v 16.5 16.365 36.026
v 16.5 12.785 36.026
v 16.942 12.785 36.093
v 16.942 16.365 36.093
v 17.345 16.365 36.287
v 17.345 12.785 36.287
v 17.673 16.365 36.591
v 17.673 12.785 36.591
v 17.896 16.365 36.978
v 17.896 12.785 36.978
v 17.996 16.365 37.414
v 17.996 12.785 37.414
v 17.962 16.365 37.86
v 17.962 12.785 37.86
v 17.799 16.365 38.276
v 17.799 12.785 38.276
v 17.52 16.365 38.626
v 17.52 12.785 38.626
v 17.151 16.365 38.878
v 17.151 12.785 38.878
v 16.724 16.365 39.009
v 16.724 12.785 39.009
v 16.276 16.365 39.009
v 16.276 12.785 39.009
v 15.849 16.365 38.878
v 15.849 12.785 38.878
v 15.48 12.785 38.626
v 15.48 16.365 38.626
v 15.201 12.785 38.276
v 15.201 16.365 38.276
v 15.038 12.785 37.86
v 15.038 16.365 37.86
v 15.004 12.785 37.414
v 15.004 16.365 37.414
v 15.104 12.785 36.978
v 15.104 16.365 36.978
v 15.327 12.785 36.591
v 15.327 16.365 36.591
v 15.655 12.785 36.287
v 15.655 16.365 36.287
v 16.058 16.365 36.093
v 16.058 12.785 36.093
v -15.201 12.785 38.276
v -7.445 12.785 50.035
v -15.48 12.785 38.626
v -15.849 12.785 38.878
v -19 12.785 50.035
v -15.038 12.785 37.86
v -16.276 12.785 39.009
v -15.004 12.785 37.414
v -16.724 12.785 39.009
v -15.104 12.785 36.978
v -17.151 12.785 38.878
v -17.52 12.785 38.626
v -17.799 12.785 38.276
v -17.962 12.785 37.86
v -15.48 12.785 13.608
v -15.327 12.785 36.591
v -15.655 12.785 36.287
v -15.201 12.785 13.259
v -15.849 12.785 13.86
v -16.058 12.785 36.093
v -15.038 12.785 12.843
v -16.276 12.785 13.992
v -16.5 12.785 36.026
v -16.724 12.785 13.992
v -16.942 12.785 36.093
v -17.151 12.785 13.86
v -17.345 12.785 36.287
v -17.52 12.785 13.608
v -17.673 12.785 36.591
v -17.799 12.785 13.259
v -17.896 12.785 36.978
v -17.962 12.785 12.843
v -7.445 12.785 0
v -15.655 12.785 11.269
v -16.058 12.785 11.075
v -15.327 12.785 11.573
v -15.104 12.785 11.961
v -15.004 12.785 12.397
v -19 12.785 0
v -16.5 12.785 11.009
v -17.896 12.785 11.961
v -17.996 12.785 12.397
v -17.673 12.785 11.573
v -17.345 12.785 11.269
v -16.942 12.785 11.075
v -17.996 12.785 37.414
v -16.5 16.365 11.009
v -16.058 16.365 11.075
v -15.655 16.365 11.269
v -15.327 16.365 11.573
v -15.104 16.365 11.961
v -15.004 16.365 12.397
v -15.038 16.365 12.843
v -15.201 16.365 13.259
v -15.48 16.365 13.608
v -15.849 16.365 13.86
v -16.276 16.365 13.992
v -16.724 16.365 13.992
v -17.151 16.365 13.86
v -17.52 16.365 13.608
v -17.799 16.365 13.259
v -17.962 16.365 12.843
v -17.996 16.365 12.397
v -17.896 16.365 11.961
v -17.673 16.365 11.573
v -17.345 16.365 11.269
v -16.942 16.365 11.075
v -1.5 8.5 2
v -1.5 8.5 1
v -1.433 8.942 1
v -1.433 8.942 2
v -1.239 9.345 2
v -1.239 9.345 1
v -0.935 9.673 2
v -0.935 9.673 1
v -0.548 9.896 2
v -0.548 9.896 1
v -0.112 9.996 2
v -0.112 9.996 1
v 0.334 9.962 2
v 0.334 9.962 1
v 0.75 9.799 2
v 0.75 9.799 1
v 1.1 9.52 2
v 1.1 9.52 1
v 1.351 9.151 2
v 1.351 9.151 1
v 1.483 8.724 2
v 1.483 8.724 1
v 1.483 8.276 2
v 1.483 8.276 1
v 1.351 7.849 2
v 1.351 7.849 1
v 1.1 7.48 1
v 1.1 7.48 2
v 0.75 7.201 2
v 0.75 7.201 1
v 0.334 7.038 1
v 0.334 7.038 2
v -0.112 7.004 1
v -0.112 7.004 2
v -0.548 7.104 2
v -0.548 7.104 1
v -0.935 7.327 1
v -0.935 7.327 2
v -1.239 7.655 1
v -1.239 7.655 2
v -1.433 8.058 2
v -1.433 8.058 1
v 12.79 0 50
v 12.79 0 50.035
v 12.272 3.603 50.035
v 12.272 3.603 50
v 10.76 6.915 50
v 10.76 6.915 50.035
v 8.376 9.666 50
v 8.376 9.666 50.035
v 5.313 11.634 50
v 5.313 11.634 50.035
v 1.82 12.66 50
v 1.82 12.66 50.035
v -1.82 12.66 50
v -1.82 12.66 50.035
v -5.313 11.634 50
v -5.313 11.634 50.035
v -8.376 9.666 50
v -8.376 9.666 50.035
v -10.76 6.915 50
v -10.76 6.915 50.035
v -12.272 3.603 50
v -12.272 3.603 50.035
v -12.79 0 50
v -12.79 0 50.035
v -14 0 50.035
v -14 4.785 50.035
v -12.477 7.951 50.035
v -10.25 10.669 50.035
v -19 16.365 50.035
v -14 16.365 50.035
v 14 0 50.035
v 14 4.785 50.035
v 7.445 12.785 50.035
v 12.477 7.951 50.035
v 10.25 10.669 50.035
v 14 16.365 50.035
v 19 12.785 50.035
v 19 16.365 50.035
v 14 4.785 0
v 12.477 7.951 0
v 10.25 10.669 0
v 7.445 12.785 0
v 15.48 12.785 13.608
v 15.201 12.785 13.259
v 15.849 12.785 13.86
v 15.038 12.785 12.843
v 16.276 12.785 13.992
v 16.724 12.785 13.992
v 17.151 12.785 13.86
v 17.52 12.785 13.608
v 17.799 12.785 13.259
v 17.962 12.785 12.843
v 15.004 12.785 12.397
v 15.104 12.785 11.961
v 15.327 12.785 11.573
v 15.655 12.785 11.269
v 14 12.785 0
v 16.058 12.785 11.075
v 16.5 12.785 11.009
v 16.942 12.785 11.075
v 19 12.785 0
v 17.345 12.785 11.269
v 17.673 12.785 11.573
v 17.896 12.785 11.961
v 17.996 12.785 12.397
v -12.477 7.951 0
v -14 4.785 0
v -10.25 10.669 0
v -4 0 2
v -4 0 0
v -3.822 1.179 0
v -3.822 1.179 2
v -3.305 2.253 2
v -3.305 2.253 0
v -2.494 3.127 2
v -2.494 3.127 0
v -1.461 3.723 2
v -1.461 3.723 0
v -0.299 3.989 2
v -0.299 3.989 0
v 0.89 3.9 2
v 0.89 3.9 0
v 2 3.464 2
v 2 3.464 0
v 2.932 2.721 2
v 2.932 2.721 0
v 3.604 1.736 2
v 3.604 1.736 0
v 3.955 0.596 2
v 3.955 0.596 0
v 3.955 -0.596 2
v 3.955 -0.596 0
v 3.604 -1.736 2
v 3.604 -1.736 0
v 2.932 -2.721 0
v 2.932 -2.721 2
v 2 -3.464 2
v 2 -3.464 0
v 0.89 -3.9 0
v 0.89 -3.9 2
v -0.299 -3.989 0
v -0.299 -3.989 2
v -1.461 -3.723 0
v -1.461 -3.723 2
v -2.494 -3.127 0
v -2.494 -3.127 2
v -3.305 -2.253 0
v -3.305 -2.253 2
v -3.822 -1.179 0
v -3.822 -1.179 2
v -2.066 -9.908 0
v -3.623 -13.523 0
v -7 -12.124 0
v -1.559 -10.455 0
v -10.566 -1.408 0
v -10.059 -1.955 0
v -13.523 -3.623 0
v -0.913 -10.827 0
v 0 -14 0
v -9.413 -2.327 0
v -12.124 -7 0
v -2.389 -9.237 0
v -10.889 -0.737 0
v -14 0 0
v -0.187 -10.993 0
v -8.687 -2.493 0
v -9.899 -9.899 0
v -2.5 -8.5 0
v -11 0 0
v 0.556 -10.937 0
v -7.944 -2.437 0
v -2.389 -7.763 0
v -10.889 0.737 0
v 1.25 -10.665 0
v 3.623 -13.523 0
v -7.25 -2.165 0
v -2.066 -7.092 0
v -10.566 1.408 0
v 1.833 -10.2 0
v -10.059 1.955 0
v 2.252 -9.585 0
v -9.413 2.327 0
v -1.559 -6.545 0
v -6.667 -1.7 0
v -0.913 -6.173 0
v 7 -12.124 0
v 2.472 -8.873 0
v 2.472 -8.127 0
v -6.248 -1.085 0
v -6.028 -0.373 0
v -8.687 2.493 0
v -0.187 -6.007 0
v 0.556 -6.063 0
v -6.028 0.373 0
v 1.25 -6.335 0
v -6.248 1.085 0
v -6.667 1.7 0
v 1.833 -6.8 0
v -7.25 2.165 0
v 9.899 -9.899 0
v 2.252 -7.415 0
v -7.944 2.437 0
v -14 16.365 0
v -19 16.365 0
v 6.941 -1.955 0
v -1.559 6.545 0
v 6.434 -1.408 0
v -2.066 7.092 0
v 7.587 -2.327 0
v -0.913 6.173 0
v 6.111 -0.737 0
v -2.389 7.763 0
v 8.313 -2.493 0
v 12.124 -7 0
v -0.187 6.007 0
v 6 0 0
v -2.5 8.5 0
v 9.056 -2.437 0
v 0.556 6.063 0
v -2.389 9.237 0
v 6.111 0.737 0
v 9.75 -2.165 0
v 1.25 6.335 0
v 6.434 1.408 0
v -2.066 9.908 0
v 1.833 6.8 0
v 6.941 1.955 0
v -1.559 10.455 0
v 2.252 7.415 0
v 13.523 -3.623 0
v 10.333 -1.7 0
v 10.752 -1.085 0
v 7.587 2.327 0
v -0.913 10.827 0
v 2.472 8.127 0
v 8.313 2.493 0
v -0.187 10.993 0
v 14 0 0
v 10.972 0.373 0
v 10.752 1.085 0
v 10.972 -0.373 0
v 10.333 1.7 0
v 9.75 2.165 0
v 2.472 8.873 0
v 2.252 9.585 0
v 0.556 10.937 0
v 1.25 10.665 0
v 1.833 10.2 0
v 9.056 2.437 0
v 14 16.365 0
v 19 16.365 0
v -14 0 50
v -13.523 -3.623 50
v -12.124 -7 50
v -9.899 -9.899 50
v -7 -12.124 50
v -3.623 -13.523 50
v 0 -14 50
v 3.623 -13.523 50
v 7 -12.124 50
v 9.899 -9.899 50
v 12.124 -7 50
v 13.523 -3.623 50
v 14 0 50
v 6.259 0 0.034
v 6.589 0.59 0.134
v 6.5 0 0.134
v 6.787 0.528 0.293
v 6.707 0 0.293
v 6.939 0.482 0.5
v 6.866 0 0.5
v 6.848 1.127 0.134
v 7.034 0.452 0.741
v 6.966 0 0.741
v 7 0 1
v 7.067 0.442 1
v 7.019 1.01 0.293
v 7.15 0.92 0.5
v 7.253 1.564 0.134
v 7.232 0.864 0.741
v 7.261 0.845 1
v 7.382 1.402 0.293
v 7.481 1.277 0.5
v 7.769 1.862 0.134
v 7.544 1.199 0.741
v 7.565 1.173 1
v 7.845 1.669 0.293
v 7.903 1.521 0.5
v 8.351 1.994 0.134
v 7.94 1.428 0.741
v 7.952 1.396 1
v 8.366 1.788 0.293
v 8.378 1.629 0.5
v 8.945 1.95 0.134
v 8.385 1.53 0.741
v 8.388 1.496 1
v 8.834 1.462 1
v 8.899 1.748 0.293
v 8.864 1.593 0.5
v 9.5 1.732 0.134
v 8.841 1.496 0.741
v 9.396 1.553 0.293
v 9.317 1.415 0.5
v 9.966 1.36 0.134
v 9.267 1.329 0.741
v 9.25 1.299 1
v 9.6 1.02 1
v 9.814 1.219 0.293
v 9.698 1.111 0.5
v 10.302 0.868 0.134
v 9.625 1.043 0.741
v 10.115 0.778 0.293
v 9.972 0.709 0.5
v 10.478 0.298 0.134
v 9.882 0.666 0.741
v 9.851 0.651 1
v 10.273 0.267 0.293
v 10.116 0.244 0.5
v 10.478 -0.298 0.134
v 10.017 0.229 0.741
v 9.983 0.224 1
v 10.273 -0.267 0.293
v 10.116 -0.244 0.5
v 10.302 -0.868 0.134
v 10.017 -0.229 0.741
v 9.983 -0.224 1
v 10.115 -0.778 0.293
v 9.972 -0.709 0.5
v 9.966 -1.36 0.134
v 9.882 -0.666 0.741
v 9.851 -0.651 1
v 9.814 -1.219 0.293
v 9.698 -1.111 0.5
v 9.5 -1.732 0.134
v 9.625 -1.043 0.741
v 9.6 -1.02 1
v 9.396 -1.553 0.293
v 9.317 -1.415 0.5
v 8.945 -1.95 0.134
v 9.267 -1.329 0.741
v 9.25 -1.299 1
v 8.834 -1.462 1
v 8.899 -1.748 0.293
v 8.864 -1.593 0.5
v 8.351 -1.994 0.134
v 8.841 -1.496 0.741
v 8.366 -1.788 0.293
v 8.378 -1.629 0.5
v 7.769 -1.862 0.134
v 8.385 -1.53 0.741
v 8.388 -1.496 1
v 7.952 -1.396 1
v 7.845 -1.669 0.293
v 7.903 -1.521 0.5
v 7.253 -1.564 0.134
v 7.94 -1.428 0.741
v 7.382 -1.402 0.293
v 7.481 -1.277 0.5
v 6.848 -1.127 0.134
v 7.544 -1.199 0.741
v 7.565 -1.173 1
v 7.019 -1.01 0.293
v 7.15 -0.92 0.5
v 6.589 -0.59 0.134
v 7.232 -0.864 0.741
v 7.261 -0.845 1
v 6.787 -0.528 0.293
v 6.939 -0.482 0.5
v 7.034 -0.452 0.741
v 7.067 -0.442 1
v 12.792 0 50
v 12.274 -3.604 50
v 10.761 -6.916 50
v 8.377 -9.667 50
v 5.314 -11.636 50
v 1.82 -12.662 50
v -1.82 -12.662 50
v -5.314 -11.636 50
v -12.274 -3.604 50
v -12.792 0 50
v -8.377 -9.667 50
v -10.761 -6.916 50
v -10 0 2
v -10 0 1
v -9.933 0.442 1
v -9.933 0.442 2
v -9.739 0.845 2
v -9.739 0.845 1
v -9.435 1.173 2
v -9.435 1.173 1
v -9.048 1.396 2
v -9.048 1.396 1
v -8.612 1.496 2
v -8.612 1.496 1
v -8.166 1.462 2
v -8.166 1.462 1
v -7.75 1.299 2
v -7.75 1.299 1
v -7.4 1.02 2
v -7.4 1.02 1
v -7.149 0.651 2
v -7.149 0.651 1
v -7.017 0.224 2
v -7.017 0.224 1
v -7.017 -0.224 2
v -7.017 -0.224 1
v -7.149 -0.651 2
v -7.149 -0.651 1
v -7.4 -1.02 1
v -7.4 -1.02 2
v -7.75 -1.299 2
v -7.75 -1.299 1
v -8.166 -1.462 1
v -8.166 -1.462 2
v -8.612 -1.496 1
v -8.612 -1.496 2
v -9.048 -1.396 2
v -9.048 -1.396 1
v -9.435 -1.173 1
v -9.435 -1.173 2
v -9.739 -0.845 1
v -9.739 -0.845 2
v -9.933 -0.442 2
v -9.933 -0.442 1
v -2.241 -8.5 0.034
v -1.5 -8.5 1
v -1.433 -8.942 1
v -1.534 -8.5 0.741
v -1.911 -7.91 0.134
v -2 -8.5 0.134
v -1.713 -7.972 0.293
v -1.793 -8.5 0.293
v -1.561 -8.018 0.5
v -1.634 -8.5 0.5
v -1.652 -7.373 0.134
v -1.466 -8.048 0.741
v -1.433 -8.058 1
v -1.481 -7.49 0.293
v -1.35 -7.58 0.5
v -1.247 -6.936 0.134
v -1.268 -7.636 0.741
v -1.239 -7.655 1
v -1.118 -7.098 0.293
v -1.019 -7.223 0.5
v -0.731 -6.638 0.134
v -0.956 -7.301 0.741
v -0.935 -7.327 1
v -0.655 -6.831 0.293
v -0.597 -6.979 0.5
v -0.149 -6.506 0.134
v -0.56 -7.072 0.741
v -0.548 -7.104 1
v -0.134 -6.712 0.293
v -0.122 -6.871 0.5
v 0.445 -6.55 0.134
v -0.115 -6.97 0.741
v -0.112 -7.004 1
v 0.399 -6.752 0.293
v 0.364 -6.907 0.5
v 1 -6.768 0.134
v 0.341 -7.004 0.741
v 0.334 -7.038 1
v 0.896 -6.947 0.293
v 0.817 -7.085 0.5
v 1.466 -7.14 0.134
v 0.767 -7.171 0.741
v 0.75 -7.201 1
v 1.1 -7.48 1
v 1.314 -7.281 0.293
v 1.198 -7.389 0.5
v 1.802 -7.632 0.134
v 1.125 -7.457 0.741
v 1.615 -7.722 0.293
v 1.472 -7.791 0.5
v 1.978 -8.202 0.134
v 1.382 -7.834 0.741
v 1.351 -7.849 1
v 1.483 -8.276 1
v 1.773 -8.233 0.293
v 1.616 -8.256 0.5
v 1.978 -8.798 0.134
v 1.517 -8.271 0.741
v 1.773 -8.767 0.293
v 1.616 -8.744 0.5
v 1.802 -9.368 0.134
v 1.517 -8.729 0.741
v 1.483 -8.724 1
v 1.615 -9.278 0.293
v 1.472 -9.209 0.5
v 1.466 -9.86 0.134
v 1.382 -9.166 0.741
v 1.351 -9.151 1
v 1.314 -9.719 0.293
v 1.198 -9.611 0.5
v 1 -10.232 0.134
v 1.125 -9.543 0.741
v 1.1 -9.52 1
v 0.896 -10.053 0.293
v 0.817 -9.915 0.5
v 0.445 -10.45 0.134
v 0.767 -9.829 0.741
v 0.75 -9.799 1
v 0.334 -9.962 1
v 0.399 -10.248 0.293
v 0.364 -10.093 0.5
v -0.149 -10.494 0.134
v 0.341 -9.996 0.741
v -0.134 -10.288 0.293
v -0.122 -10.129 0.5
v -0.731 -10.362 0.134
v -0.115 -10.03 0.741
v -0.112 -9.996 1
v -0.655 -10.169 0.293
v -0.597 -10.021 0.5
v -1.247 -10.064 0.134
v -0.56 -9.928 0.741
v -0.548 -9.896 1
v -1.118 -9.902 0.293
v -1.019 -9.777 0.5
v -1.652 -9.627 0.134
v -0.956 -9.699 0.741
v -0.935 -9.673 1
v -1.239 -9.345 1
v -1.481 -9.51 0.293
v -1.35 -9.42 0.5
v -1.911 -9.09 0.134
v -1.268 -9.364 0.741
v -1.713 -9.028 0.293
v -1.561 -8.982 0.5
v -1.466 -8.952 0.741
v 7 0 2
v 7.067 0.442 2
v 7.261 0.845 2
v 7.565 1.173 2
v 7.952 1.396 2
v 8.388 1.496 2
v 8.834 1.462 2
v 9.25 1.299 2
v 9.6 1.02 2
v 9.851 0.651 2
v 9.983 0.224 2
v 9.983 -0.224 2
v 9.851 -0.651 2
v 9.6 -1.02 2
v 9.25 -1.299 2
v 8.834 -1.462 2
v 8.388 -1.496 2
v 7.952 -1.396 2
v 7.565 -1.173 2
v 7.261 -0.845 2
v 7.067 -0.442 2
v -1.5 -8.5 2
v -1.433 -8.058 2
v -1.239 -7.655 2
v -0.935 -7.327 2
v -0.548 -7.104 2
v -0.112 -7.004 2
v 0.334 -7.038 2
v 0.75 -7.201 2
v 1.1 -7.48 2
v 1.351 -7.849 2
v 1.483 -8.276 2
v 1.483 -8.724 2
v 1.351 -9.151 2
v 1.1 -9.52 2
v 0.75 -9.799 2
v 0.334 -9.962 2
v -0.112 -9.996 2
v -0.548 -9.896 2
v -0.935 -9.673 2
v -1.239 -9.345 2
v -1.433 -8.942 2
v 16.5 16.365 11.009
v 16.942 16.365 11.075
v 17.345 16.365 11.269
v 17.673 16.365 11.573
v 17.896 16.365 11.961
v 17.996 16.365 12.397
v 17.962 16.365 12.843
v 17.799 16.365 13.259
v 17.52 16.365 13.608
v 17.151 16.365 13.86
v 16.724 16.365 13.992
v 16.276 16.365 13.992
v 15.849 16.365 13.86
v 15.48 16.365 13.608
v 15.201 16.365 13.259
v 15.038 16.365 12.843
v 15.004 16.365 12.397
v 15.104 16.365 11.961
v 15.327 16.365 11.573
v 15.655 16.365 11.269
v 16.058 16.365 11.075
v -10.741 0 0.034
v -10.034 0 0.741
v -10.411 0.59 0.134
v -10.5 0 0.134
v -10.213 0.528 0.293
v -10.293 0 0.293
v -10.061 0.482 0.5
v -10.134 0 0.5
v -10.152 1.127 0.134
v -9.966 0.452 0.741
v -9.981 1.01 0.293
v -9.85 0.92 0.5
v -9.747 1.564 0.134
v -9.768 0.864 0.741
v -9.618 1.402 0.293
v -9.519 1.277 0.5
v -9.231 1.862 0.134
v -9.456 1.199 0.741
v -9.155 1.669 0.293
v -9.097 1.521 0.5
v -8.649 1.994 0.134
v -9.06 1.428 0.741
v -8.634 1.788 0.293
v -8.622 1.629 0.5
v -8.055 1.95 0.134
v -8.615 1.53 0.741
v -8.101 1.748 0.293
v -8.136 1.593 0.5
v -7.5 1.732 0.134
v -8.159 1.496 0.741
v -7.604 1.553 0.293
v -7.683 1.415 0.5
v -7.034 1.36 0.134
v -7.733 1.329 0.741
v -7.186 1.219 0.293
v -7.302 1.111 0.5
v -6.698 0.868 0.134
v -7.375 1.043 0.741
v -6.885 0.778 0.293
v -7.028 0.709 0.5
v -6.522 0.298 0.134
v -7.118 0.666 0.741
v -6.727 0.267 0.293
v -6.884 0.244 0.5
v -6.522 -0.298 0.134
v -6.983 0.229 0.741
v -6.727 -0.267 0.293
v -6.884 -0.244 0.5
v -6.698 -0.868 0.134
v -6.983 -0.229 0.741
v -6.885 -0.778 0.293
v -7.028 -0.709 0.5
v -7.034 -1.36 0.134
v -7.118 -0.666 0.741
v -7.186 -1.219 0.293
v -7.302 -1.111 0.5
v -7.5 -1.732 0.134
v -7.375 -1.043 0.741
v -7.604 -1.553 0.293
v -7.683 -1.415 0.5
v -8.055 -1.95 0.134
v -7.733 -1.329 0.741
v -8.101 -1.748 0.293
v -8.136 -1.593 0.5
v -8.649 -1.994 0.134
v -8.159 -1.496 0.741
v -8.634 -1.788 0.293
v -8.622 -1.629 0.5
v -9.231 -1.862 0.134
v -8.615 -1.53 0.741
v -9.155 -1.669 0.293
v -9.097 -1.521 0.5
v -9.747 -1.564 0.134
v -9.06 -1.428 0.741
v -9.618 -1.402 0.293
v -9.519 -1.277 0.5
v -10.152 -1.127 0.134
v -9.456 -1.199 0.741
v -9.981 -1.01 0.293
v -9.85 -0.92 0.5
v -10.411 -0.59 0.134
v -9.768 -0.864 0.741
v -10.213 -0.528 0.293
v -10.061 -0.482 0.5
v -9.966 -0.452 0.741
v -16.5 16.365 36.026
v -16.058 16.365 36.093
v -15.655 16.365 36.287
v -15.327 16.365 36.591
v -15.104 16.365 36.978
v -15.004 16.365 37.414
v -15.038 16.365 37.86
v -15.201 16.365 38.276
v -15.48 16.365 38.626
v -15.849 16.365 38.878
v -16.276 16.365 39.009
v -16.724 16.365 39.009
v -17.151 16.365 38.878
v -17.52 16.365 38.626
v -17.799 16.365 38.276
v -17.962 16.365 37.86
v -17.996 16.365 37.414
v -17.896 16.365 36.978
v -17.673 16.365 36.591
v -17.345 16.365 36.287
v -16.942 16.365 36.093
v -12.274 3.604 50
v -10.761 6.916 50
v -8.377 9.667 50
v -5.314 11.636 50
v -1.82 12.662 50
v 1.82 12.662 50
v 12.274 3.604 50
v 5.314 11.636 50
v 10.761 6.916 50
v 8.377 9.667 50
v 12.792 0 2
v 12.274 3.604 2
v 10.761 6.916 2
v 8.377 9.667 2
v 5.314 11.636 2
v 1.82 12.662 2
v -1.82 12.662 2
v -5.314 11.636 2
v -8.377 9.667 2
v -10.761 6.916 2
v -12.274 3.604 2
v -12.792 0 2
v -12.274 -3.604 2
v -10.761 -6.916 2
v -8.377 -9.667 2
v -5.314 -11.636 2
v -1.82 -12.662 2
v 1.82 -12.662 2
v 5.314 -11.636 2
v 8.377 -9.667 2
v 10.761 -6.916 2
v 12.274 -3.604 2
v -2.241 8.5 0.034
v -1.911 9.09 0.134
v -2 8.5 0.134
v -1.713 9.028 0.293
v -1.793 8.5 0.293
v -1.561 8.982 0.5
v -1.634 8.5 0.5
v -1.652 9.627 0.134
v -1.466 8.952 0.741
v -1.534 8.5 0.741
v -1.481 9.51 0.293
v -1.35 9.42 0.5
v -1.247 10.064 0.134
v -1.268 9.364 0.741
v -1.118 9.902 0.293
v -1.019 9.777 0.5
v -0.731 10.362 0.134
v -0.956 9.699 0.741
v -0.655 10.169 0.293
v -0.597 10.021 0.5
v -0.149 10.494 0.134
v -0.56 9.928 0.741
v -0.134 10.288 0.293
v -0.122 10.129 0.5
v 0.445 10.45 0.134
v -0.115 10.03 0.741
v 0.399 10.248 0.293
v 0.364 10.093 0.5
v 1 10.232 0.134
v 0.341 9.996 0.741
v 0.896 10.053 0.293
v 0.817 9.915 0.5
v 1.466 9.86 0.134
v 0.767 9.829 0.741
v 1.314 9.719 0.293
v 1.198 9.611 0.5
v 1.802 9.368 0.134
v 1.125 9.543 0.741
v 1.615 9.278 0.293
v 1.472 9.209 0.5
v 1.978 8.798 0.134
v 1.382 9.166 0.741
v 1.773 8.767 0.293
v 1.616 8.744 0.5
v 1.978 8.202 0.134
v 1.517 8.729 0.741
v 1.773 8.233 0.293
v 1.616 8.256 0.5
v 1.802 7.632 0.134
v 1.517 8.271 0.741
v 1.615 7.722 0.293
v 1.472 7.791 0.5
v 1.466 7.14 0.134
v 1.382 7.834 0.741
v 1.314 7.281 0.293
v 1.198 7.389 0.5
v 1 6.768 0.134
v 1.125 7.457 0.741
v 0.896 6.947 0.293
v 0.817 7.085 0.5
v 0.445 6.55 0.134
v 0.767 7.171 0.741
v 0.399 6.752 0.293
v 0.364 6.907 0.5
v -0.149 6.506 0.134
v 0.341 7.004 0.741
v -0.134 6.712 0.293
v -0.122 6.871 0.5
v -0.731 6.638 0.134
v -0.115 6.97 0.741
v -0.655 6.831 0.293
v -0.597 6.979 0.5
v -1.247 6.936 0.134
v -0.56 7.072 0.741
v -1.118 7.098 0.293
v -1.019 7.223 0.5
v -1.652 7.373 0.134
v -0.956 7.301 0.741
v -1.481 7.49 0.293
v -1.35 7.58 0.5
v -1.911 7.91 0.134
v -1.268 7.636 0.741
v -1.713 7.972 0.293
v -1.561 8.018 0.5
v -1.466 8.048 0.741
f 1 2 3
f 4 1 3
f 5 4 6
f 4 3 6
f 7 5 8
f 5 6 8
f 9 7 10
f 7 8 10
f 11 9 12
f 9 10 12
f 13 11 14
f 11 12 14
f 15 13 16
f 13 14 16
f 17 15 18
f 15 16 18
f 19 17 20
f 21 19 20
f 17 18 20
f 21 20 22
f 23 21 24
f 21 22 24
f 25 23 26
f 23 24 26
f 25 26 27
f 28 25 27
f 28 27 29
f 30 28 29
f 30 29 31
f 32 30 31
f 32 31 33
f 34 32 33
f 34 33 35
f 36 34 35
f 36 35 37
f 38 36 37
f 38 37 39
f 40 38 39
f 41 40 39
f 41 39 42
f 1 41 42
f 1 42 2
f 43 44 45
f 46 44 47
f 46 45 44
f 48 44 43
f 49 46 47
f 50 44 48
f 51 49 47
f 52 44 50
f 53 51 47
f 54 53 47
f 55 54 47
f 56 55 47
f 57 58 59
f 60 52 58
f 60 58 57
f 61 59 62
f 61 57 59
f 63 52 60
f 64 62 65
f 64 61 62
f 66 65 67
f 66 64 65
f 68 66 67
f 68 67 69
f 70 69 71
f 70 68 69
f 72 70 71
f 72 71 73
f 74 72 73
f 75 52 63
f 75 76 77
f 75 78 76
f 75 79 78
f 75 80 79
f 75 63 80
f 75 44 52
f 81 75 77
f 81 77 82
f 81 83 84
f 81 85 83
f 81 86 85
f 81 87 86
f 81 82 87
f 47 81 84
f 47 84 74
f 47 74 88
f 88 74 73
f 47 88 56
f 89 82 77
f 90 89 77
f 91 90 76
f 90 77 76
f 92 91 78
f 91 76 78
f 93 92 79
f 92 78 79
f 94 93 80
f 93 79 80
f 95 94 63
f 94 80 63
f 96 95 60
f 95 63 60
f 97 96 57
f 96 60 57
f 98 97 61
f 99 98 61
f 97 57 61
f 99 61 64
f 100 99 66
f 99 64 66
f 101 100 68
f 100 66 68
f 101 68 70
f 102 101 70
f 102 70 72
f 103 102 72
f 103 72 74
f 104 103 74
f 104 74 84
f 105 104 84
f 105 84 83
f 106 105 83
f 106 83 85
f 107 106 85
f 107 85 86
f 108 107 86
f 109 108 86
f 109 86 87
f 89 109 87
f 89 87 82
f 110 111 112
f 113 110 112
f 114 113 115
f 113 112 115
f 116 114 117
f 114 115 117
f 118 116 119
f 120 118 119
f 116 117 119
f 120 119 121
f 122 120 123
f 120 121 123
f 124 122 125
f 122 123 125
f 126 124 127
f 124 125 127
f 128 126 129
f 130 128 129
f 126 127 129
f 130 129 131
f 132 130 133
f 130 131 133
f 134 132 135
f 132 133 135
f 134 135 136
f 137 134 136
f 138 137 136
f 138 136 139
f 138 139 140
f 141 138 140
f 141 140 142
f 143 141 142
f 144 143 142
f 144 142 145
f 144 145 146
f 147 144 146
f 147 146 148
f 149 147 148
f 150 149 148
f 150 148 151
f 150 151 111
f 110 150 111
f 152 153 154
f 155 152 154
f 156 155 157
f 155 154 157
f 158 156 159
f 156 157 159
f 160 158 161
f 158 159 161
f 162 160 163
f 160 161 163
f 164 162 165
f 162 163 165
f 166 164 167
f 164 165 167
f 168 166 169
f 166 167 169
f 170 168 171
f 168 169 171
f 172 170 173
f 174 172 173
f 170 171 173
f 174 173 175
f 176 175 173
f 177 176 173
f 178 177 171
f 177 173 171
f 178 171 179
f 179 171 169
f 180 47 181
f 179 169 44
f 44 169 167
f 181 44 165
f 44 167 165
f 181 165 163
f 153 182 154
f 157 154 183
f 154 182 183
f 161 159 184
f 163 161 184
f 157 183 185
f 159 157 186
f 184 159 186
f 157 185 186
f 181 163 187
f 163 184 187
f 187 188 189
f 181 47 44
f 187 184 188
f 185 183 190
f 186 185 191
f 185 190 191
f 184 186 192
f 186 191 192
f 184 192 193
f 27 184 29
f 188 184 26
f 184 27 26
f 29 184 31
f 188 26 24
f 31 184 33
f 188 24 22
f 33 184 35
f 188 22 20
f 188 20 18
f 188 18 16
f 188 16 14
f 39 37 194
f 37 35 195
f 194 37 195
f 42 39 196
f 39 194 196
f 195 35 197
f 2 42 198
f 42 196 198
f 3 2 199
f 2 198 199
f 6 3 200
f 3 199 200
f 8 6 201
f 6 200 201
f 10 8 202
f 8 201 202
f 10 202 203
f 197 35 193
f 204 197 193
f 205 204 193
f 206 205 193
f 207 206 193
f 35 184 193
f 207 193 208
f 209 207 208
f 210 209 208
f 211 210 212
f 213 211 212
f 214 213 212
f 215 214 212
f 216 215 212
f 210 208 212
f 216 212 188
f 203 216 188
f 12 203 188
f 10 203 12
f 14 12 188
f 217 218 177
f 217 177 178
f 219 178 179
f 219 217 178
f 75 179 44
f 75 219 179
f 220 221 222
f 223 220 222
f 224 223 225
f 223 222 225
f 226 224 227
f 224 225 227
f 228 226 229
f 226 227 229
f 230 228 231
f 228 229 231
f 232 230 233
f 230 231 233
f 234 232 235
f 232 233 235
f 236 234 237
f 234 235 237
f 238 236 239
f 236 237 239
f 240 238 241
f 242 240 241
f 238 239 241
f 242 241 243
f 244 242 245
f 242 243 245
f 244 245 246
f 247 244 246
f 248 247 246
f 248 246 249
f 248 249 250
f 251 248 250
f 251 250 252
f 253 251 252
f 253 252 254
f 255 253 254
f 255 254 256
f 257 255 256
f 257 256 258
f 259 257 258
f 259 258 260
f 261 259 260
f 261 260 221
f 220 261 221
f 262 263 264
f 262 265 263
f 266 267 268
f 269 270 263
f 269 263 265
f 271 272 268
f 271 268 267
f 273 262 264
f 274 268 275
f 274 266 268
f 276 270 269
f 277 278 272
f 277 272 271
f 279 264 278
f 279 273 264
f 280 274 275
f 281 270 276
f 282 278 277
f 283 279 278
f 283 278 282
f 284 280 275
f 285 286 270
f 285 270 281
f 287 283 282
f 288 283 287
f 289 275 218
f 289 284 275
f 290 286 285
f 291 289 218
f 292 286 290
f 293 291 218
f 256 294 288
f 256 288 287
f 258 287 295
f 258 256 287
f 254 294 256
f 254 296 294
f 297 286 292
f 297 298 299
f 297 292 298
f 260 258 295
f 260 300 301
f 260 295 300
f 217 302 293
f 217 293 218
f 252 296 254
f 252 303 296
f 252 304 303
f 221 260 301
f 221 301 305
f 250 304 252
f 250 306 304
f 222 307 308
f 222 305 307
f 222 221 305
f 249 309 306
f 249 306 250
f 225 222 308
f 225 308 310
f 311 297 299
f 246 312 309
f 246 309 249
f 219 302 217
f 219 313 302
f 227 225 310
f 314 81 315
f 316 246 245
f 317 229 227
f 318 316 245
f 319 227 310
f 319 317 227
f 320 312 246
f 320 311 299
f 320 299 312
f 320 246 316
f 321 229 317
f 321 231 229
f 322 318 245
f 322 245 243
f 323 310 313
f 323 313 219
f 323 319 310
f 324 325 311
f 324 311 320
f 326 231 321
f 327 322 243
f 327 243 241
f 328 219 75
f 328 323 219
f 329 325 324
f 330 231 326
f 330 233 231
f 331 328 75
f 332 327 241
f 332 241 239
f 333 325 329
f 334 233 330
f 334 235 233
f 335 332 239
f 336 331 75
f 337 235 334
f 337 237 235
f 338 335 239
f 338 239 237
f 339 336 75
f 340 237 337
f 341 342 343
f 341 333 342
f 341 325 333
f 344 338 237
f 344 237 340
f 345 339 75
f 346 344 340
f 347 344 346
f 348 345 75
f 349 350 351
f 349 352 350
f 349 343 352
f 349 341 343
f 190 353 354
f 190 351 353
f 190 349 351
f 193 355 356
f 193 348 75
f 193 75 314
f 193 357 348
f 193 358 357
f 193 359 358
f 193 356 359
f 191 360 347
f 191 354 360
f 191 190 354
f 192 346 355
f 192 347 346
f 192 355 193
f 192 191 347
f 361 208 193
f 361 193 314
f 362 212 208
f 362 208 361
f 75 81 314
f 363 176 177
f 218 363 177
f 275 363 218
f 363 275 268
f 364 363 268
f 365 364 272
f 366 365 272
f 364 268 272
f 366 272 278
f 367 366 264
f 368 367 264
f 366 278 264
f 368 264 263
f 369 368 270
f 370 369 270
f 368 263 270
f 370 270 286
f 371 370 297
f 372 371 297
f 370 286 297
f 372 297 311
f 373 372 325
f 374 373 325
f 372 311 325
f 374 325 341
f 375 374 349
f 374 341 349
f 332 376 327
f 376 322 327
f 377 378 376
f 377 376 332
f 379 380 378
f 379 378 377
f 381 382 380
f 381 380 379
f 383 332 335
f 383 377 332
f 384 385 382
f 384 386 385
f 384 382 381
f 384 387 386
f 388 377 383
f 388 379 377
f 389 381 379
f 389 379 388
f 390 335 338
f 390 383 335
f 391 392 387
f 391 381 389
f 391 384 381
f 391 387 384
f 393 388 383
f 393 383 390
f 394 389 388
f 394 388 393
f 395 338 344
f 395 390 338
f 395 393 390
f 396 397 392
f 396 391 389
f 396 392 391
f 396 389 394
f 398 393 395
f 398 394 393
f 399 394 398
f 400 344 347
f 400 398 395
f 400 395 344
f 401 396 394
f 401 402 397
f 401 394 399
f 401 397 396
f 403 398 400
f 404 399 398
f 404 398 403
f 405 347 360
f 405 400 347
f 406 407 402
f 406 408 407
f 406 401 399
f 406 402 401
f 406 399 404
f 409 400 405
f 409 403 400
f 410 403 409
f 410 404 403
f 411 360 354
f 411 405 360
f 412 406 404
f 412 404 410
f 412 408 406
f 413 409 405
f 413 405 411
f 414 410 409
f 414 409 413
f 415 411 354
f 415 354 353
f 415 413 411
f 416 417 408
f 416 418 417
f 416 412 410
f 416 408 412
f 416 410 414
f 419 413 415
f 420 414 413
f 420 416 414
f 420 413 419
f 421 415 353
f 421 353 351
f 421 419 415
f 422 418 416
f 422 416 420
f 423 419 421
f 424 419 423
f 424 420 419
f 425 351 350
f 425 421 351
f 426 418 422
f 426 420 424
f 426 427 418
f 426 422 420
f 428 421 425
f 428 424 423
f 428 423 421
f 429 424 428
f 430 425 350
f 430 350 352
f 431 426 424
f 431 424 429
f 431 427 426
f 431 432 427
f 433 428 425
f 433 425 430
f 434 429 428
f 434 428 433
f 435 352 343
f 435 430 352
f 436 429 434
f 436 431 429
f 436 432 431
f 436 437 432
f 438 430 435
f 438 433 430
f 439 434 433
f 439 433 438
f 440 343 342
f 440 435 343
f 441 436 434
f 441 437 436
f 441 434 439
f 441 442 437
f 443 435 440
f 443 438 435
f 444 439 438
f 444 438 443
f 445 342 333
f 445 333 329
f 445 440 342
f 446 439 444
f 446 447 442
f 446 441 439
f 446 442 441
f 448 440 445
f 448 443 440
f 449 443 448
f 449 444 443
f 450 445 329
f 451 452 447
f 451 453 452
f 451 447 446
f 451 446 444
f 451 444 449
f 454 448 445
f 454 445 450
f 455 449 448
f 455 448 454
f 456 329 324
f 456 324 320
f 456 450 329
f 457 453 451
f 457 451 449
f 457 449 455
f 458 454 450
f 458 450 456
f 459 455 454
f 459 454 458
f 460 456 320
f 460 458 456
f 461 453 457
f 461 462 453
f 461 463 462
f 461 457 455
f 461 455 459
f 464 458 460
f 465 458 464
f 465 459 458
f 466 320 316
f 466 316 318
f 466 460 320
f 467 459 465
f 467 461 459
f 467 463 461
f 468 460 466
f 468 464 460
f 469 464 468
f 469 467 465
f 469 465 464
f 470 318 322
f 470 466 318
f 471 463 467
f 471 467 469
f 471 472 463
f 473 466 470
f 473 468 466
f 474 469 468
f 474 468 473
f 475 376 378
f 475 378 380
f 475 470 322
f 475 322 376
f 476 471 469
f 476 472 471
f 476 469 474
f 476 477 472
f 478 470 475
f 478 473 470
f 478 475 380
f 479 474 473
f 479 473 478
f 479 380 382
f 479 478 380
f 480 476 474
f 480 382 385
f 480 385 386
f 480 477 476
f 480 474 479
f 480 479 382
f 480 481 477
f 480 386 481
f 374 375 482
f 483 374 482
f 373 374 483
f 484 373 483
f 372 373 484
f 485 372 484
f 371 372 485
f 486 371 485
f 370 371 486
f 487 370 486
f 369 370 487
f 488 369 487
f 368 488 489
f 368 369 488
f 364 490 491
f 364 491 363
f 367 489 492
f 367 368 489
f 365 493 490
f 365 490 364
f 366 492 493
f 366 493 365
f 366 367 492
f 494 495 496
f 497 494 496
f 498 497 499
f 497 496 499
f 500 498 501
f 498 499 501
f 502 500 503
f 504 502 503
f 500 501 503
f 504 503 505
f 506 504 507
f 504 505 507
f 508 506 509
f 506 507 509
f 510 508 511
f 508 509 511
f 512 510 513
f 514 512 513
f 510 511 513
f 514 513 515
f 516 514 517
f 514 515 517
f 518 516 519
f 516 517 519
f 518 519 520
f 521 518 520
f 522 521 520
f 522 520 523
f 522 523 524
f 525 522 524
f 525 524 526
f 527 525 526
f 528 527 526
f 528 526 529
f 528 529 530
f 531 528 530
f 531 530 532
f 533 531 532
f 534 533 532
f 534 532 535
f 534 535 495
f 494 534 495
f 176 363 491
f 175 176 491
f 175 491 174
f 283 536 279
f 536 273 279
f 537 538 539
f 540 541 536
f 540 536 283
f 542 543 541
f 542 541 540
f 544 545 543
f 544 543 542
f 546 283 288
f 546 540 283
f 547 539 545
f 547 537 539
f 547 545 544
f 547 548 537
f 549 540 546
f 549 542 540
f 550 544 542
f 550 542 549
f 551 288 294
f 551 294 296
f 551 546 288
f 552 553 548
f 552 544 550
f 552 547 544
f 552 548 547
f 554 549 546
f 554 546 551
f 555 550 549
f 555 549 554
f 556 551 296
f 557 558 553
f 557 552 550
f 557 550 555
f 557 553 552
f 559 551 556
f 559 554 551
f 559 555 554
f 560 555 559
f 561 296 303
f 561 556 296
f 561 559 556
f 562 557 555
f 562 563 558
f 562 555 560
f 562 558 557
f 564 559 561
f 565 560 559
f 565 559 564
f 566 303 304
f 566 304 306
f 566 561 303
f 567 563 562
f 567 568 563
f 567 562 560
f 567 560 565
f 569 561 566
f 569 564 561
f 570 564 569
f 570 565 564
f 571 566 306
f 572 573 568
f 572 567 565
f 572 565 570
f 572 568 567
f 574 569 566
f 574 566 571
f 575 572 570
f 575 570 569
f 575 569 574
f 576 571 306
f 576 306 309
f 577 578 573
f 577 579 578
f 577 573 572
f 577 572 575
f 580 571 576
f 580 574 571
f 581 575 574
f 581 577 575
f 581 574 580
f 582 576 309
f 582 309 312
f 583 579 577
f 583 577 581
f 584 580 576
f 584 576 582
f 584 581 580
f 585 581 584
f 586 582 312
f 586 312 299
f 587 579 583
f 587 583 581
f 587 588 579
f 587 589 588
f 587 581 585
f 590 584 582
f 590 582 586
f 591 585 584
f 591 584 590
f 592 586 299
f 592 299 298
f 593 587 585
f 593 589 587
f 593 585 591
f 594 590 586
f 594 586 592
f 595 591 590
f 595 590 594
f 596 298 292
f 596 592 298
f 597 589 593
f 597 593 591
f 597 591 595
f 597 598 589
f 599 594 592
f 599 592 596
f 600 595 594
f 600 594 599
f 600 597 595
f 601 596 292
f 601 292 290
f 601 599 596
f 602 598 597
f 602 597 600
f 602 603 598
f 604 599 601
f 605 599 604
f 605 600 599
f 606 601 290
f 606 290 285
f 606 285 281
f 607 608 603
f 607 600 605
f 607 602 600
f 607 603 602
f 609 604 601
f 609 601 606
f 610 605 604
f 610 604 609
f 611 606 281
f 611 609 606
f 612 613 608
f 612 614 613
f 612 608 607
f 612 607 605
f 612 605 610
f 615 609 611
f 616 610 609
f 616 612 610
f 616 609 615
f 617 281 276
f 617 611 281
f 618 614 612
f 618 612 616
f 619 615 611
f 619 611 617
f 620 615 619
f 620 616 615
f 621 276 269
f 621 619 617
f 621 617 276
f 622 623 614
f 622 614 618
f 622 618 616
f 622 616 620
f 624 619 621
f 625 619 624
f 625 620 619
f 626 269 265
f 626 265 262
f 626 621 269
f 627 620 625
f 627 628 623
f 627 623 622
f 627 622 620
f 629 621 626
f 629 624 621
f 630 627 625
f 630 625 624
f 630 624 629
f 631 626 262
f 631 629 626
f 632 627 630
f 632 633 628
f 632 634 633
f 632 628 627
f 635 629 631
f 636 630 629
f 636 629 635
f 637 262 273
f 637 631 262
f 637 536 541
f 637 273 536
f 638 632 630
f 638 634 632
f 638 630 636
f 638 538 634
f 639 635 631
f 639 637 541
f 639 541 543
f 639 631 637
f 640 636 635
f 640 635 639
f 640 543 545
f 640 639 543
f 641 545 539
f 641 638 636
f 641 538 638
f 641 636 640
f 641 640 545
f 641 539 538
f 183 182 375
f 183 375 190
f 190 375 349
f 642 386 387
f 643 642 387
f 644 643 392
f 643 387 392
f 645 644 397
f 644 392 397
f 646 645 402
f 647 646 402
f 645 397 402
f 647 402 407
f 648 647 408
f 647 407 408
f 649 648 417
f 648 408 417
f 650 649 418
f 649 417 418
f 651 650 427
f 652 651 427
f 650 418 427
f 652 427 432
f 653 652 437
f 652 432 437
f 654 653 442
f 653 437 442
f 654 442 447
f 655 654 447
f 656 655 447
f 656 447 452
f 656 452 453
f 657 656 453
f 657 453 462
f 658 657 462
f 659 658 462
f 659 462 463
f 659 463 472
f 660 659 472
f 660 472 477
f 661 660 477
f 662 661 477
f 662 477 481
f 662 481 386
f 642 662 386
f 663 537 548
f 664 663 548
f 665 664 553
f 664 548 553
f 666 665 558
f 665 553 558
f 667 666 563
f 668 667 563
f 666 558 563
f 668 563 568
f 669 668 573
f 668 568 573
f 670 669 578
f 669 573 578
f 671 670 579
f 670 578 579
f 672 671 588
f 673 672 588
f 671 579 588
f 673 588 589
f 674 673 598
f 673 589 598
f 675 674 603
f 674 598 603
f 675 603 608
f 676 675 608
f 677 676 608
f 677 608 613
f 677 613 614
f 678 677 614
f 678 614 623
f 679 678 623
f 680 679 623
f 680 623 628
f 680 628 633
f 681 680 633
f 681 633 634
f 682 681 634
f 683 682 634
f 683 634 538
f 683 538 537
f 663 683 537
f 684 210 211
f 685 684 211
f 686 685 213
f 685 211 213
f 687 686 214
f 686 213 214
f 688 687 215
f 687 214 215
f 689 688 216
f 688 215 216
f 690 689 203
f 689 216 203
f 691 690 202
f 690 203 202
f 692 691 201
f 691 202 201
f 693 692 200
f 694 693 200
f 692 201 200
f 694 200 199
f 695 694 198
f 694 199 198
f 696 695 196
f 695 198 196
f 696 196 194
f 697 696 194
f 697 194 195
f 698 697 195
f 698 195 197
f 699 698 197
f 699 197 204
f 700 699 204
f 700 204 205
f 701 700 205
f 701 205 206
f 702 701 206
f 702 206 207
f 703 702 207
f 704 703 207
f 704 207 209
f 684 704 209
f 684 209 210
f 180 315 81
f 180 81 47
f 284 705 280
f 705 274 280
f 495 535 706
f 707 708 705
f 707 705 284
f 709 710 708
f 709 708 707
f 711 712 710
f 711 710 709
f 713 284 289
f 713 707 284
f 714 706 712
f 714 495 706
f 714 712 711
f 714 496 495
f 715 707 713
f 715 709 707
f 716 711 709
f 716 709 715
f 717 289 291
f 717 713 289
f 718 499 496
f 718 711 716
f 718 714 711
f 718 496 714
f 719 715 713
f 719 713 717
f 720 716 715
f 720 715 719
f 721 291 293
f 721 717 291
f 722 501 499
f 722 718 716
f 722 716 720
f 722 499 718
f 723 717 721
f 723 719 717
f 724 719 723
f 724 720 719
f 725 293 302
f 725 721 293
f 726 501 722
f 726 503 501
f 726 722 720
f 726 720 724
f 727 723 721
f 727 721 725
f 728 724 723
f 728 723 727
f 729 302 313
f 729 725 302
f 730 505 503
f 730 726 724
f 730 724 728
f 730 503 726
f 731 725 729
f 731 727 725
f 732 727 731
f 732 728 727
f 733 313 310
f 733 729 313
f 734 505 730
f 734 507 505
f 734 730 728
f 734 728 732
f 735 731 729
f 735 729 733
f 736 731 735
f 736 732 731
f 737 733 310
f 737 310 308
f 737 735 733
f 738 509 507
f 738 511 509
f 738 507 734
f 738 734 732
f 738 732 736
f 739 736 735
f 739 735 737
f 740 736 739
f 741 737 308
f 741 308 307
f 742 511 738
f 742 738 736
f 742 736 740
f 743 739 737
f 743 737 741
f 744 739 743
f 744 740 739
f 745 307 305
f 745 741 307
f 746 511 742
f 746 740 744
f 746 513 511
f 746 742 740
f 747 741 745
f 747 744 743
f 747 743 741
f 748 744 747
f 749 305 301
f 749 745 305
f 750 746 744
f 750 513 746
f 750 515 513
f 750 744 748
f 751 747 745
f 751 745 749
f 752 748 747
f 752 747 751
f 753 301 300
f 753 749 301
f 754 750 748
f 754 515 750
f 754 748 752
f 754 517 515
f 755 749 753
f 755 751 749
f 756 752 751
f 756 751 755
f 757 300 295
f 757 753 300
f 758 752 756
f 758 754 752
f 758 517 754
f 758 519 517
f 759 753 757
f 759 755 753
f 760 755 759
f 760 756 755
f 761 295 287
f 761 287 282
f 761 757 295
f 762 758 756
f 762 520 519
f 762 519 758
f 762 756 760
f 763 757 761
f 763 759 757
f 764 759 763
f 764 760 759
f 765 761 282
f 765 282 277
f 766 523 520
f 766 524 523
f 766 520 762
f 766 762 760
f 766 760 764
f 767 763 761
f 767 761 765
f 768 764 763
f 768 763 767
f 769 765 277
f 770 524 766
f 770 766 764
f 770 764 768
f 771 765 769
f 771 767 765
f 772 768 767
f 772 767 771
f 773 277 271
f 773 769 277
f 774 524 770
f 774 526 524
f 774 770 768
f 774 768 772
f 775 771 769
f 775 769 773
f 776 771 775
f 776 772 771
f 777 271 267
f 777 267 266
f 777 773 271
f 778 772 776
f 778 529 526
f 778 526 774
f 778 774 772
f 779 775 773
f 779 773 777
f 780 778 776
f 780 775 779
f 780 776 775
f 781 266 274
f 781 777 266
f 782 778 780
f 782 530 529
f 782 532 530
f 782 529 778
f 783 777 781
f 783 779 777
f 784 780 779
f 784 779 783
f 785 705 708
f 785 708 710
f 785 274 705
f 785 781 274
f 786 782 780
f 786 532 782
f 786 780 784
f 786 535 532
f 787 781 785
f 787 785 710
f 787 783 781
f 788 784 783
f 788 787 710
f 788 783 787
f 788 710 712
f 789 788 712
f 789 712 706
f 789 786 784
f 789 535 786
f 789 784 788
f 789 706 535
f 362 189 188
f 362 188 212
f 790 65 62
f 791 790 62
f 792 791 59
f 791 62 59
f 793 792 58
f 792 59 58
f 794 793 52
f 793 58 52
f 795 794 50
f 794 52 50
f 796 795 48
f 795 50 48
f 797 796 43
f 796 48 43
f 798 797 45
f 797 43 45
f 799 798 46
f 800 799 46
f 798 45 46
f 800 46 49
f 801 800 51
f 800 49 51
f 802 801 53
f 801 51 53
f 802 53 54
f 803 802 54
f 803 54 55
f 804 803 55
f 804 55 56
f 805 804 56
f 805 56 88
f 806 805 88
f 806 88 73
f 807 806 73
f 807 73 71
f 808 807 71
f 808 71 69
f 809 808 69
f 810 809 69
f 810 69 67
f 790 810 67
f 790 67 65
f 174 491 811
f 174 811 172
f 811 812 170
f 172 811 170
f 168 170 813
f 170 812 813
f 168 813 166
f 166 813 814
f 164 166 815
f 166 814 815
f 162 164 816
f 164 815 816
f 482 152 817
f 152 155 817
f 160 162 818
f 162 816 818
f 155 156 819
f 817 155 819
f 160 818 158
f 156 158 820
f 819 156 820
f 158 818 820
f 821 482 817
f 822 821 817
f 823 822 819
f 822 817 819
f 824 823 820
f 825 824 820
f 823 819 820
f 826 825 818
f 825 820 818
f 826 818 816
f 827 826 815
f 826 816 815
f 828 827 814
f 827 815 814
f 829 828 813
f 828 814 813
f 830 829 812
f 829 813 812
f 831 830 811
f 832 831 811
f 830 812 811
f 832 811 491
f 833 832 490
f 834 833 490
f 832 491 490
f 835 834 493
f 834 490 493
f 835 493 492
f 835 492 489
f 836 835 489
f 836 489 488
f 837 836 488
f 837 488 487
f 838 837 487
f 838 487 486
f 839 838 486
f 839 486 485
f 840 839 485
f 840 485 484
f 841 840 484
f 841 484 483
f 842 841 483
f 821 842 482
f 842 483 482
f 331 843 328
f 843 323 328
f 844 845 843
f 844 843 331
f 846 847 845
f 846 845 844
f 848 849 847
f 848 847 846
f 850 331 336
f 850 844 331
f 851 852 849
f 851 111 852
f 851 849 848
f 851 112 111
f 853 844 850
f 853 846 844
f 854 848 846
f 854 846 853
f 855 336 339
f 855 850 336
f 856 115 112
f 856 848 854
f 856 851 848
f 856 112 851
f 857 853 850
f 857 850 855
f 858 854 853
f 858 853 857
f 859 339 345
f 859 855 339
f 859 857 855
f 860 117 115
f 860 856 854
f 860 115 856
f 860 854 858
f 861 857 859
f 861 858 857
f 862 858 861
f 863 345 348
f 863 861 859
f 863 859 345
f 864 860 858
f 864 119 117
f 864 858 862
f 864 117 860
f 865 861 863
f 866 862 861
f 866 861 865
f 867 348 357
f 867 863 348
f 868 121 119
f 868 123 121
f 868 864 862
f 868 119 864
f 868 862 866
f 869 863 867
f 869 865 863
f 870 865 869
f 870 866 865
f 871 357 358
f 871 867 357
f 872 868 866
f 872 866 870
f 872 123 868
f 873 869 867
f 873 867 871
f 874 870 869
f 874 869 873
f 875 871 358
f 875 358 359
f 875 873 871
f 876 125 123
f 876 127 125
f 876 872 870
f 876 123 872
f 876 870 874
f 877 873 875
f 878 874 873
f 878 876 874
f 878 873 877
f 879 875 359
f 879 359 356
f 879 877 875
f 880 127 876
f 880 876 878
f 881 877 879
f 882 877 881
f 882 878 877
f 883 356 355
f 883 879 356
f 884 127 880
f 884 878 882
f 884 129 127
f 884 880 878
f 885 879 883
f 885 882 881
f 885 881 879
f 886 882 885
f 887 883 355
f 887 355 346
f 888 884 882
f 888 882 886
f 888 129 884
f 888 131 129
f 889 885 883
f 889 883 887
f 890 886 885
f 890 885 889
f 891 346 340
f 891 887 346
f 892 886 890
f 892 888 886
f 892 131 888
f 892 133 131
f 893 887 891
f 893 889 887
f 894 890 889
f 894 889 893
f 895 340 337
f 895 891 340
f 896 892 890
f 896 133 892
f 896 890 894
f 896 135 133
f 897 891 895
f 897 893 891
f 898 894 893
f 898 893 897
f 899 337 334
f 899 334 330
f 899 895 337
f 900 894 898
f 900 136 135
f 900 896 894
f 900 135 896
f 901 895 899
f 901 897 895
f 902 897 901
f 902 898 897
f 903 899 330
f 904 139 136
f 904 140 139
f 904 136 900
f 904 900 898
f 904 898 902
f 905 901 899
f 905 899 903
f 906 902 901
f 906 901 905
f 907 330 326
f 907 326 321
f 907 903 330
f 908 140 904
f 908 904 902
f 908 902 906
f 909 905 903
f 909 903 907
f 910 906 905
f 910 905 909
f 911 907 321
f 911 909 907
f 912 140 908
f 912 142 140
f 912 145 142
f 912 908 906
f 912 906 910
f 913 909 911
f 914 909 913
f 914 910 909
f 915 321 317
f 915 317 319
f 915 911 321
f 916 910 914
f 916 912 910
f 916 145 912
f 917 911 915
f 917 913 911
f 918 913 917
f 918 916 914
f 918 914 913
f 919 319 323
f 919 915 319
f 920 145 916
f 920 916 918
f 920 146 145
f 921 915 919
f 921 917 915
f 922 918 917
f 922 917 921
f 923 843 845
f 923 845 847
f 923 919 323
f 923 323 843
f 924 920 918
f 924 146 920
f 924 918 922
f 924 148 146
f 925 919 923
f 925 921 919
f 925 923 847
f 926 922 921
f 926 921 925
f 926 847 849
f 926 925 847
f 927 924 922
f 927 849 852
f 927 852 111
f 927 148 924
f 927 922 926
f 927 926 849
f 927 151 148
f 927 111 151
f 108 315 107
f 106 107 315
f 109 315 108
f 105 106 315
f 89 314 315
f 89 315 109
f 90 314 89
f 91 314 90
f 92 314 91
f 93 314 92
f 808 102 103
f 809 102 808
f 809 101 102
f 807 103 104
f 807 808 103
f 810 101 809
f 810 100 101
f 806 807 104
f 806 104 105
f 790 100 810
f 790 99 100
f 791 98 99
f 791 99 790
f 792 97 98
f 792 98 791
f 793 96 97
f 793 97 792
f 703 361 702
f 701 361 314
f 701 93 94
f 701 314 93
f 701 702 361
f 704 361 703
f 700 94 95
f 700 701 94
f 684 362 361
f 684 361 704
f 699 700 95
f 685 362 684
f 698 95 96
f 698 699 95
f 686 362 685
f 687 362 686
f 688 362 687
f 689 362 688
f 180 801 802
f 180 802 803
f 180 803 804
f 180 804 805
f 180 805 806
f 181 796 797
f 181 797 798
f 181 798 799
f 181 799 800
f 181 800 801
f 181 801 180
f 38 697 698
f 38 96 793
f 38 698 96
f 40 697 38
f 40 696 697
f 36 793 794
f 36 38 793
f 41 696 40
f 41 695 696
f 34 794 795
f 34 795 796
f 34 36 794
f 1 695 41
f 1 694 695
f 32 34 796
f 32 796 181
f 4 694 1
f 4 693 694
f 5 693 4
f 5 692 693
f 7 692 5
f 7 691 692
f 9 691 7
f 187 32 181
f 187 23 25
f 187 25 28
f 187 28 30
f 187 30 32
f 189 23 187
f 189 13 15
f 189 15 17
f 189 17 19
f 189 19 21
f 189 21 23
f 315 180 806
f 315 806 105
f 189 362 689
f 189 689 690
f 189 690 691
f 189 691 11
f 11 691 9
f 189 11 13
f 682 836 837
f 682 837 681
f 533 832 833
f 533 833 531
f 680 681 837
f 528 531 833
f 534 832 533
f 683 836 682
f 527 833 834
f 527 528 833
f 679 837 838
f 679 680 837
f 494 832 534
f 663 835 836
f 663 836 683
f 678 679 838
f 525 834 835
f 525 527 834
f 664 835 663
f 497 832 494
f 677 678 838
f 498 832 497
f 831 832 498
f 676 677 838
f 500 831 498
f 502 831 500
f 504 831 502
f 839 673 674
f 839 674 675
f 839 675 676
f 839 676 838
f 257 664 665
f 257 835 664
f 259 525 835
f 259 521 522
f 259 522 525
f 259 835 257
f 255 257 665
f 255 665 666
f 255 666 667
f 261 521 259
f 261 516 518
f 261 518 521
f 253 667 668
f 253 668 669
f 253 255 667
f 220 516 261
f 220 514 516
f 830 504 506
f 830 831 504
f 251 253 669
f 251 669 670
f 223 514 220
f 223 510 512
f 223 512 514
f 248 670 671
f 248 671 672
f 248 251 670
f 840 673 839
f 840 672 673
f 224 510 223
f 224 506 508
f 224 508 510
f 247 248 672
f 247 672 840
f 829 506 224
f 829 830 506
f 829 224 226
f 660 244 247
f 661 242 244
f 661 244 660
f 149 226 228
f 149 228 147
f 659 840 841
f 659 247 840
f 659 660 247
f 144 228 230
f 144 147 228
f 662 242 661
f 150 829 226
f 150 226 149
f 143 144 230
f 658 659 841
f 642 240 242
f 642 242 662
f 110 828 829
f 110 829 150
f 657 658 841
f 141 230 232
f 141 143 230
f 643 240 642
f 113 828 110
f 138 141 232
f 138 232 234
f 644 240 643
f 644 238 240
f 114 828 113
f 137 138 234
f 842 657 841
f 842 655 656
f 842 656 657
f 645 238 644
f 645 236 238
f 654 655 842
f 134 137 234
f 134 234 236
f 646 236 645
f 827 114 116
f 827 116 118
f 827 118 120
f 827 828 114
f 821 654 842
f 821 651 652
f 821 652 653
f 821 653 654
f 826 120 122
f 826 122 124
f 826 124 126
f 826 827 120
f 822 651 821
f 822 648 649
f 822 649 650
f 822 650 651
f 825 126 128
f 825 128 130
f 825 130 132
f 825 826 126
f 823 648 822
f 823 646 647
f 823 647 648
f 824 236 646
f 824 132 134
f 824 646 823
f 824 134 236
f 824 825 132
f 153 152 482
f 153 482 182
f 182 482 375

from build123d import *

# Parameters (mm, degrees)
SKETCH1_R           = 14
BOSS_EXTRUDE1_DEPTH = 50
SKETCH5_W           = 28
SKETCH5_H           = 50.034880911
BOSS_EXTRUDE2_DEPTH = 21
SKETCH2_R           = 12.791811967
CUT_EXTRUDE1_DEPTH  = 48
SKETCH3_R           = 4
CUT_EXTRUDE2_DEPTH  = 49
SKETCH4_R           = 1.5
CUT_EXTRUDE3_DEPTH  = 49
SKETCH6_R           = 12.79
CUT_EXTRUDE5_DEPTH  = 21
SKETCH7_W           = 28
SKETCH7_H           = 4.634699127
CUT_EXTRUDE6_DEPTH  = 53
SKETCH8_W           = 50.034880911
SKETCH8_H           = 3.58
BOSS_EXTRUDE3_DEPTH = 5
SKETCH13_R          = 1.5
CUT_EXTRUDE7_DEPTH  = 5
SKETCH14_W          = 50.034880911
SKETCH14_H          = 3.58
BOSS_EXTRUDE4_DEPTH = 5
SKETCH15_R          = 1.5
CUT_EXTRUDE8_DEPTH  = 5
FILLET1_R           = 1
FILLET2_R           = 1
CUT_EXTRUDE9_DEPTH  = 73


with BuildPart() as part:
    # Sketch1 → Boss-Extrude1 (new body)
    with BuildSketch(Plane.XY):
        with Locations(Location((0, 0, 0), (0, 0, 180))):
            Circle(SKETCH1_R)
    extrude(amount=BOSS_EXTRUDE1_DEPTH)

    # Sketch5 → Boss-Extrude2 (add)
    with BuildSketch(Plane(origin=(0, 0, 0), x_dir=(1, 0, 0), z_dir=(0, 1, 0))):
        with Locations((0, -25.017440456)):
            Rectangle(SKETCH5_W, SKETCH5_H)
    extrude(amount=BOSS_EXTRUDE2_DEPTH)

    # Sketch2 → Cut-Extrude1 (cut)
    with BuildSketch(Plane.XY.offset(50)):
        Circle(SKETCH2_R)
    extrude(amount=-CUT_EXTRUDE1_DEPTH, mode=Mode.SUBTRACT)

    # Sketch3 → Cut-Extrude2 (cut)
    with BuildSketch(Plane(origin=(0, 0, 0), x_dir=(-1, 0, 0), z_dir=(0, 0, -1))):
        Circle(SKETCH3_R)
    extrude(amount=-CUT_EXTRUDE2_DEPTH, mode=Mode.SUBTRACT)

    # Sketch4 → Cut-Extrude3 (cut)
    with BuildSketch(Plane(origin=(0, 0, 0), x_dir=(-1, 0, 0), z_dir=(0, 0, -1))):
        with Locations((0, -8.5)):
            Circle(SKETCH4_R)
        with Locations((0, 8.5)):
            Circle(SKETCH4_R)
        with Locations((8.5, 0)):
            Circle(SKETCH4_R)
        with Locations((-8.5, 0)):
            Circle(SKETCH4_R)
    extrude(amount=-CUT_EXTRUDE3_DEPTH, mode=Mode.SUBTRACT)

    # Sketch6 → Cut-Extrude5 (cut)
    with BuildSketch(Plane.XY.offset(50.034880911)):
        Circle(SKETCH6_R)
    extrude(amount=-CUT_EXTRUDE5_DEPTH, mode=Mode.SUBTRACT)

    # Sketch7 → Cut-Extrude6 (cut)
    with BuildSketch(Plane.XY.offset(50.034880911)):
        with Locations((0, 18.682650437)):
            Rectangle(SKETCH7_W, SKETCH7_H)
    extrude(amount=-CUT_EXTRUDE6_DEPTH, mode=Mode.SUBTRACT)

    # Sketch8 → Boss-Extrude3 (add)
    with BuildSketch(Plane(origin=(14, 0, 0), x_dir=(0, 0, -1), z_dir=(1, 0, 0))):
        with Locations((-25.017440456, 14.575300873)):
            Rectangle(SKETCH8_W, SKETCH8_H)
    extrude(amount=BOSS_EXTRUDE3_DEPTH)

    # Sketch13 → Cut-Extrude7 (cut)
    with BuildSketch(Plane.XZ.offset(-12.785300873)):
        with Locations(Location((16.5, 37.526160683, 0), (0, 0, 270))):
            Circle(SKETCH13_R)
        with Locations(Location((16.5, 12.508720228, 0), (0, 0, 270))):
            Circle(SKETCH13_R)
    extrude(amount=-CUT_EXTRUDE7_DEPTH, mode=Mode.SUBTRACT)

    # Sketch14 → Boss-Extrude4 (add)
    with BuildSketch(Plane.ZY.offset(14)):
        with Locations((25.017440456, 14.575300873)):
            Rectangle(SKETCH14_W, SKETCH14_H)
    extrude(amount=BOSS_EXTRUDE4_DEPTH)

    # Sketch15 → Cut-Extrude8 (cut)
    with BuildSketch(Plane.XZ.offset(-12.785300873)):
        with Locations(Location((-16.5, 12.508720228, 0), (0, 0, 270))):
            Circle(SKETCH15_R)
        with Locations(Location((-16.5, 37.526160683, 0), (0, 0, 270))):
            Circle(SKETCH15_R)
    extrude(amount=-CUT_EXTRUDE8_DEPTH, mode=Mode.SUBTRACT)

    # Fillet1
    fillet1_edges = [part.edges().sort_by_distance(p)[0] for p in [
        (10, 0, 0),
    ]]
    fillet(fillet1_edges, radius=FILLET1_R)

    # Fillet2
    fillet2_edges = [part.edges().sort_by_distance(p)[0] for p in [
        (1.5, -8.5, 0),
        (1.5, 8.5, 0),
        (-7, 0, 0),
    ]]
    fillet(fillet2_edges, radius=FILLET2_R)

    # Sketch16 → Cut-Extrude9 (cut)
    with BuildSketch(Plane(origin=(0, 0, 0), x_dir=(-1, 0, 0), z_dir=(0, 0, -1))):
        with BuildLine():
            Line((-7.445480913, 12.785300873), (-14, 12.785300873))
            Line((-14, 12.785300873), (-14, 4.785300873))
            ThreePointArc((-14, 4.785300873), (-11.444525455, 9.376670067), (-7.445480913, 12.785300873))
        make_face()
        with BuildLine():
            Line((14, 12.785300873), (14, 4.785300873))
            ThreePointArc((14, 4.785300873), (11.444525455, 9.376670067), (7.445480913, 12.785300873))
            Line((7.445480913, 12.785300873), (14, 12.785300873))
        make_face()
    extrude(amount=-CUT_EXTRUDE9_DEPTH, mode=Mode.SUBTRACT)


solid = part.part
